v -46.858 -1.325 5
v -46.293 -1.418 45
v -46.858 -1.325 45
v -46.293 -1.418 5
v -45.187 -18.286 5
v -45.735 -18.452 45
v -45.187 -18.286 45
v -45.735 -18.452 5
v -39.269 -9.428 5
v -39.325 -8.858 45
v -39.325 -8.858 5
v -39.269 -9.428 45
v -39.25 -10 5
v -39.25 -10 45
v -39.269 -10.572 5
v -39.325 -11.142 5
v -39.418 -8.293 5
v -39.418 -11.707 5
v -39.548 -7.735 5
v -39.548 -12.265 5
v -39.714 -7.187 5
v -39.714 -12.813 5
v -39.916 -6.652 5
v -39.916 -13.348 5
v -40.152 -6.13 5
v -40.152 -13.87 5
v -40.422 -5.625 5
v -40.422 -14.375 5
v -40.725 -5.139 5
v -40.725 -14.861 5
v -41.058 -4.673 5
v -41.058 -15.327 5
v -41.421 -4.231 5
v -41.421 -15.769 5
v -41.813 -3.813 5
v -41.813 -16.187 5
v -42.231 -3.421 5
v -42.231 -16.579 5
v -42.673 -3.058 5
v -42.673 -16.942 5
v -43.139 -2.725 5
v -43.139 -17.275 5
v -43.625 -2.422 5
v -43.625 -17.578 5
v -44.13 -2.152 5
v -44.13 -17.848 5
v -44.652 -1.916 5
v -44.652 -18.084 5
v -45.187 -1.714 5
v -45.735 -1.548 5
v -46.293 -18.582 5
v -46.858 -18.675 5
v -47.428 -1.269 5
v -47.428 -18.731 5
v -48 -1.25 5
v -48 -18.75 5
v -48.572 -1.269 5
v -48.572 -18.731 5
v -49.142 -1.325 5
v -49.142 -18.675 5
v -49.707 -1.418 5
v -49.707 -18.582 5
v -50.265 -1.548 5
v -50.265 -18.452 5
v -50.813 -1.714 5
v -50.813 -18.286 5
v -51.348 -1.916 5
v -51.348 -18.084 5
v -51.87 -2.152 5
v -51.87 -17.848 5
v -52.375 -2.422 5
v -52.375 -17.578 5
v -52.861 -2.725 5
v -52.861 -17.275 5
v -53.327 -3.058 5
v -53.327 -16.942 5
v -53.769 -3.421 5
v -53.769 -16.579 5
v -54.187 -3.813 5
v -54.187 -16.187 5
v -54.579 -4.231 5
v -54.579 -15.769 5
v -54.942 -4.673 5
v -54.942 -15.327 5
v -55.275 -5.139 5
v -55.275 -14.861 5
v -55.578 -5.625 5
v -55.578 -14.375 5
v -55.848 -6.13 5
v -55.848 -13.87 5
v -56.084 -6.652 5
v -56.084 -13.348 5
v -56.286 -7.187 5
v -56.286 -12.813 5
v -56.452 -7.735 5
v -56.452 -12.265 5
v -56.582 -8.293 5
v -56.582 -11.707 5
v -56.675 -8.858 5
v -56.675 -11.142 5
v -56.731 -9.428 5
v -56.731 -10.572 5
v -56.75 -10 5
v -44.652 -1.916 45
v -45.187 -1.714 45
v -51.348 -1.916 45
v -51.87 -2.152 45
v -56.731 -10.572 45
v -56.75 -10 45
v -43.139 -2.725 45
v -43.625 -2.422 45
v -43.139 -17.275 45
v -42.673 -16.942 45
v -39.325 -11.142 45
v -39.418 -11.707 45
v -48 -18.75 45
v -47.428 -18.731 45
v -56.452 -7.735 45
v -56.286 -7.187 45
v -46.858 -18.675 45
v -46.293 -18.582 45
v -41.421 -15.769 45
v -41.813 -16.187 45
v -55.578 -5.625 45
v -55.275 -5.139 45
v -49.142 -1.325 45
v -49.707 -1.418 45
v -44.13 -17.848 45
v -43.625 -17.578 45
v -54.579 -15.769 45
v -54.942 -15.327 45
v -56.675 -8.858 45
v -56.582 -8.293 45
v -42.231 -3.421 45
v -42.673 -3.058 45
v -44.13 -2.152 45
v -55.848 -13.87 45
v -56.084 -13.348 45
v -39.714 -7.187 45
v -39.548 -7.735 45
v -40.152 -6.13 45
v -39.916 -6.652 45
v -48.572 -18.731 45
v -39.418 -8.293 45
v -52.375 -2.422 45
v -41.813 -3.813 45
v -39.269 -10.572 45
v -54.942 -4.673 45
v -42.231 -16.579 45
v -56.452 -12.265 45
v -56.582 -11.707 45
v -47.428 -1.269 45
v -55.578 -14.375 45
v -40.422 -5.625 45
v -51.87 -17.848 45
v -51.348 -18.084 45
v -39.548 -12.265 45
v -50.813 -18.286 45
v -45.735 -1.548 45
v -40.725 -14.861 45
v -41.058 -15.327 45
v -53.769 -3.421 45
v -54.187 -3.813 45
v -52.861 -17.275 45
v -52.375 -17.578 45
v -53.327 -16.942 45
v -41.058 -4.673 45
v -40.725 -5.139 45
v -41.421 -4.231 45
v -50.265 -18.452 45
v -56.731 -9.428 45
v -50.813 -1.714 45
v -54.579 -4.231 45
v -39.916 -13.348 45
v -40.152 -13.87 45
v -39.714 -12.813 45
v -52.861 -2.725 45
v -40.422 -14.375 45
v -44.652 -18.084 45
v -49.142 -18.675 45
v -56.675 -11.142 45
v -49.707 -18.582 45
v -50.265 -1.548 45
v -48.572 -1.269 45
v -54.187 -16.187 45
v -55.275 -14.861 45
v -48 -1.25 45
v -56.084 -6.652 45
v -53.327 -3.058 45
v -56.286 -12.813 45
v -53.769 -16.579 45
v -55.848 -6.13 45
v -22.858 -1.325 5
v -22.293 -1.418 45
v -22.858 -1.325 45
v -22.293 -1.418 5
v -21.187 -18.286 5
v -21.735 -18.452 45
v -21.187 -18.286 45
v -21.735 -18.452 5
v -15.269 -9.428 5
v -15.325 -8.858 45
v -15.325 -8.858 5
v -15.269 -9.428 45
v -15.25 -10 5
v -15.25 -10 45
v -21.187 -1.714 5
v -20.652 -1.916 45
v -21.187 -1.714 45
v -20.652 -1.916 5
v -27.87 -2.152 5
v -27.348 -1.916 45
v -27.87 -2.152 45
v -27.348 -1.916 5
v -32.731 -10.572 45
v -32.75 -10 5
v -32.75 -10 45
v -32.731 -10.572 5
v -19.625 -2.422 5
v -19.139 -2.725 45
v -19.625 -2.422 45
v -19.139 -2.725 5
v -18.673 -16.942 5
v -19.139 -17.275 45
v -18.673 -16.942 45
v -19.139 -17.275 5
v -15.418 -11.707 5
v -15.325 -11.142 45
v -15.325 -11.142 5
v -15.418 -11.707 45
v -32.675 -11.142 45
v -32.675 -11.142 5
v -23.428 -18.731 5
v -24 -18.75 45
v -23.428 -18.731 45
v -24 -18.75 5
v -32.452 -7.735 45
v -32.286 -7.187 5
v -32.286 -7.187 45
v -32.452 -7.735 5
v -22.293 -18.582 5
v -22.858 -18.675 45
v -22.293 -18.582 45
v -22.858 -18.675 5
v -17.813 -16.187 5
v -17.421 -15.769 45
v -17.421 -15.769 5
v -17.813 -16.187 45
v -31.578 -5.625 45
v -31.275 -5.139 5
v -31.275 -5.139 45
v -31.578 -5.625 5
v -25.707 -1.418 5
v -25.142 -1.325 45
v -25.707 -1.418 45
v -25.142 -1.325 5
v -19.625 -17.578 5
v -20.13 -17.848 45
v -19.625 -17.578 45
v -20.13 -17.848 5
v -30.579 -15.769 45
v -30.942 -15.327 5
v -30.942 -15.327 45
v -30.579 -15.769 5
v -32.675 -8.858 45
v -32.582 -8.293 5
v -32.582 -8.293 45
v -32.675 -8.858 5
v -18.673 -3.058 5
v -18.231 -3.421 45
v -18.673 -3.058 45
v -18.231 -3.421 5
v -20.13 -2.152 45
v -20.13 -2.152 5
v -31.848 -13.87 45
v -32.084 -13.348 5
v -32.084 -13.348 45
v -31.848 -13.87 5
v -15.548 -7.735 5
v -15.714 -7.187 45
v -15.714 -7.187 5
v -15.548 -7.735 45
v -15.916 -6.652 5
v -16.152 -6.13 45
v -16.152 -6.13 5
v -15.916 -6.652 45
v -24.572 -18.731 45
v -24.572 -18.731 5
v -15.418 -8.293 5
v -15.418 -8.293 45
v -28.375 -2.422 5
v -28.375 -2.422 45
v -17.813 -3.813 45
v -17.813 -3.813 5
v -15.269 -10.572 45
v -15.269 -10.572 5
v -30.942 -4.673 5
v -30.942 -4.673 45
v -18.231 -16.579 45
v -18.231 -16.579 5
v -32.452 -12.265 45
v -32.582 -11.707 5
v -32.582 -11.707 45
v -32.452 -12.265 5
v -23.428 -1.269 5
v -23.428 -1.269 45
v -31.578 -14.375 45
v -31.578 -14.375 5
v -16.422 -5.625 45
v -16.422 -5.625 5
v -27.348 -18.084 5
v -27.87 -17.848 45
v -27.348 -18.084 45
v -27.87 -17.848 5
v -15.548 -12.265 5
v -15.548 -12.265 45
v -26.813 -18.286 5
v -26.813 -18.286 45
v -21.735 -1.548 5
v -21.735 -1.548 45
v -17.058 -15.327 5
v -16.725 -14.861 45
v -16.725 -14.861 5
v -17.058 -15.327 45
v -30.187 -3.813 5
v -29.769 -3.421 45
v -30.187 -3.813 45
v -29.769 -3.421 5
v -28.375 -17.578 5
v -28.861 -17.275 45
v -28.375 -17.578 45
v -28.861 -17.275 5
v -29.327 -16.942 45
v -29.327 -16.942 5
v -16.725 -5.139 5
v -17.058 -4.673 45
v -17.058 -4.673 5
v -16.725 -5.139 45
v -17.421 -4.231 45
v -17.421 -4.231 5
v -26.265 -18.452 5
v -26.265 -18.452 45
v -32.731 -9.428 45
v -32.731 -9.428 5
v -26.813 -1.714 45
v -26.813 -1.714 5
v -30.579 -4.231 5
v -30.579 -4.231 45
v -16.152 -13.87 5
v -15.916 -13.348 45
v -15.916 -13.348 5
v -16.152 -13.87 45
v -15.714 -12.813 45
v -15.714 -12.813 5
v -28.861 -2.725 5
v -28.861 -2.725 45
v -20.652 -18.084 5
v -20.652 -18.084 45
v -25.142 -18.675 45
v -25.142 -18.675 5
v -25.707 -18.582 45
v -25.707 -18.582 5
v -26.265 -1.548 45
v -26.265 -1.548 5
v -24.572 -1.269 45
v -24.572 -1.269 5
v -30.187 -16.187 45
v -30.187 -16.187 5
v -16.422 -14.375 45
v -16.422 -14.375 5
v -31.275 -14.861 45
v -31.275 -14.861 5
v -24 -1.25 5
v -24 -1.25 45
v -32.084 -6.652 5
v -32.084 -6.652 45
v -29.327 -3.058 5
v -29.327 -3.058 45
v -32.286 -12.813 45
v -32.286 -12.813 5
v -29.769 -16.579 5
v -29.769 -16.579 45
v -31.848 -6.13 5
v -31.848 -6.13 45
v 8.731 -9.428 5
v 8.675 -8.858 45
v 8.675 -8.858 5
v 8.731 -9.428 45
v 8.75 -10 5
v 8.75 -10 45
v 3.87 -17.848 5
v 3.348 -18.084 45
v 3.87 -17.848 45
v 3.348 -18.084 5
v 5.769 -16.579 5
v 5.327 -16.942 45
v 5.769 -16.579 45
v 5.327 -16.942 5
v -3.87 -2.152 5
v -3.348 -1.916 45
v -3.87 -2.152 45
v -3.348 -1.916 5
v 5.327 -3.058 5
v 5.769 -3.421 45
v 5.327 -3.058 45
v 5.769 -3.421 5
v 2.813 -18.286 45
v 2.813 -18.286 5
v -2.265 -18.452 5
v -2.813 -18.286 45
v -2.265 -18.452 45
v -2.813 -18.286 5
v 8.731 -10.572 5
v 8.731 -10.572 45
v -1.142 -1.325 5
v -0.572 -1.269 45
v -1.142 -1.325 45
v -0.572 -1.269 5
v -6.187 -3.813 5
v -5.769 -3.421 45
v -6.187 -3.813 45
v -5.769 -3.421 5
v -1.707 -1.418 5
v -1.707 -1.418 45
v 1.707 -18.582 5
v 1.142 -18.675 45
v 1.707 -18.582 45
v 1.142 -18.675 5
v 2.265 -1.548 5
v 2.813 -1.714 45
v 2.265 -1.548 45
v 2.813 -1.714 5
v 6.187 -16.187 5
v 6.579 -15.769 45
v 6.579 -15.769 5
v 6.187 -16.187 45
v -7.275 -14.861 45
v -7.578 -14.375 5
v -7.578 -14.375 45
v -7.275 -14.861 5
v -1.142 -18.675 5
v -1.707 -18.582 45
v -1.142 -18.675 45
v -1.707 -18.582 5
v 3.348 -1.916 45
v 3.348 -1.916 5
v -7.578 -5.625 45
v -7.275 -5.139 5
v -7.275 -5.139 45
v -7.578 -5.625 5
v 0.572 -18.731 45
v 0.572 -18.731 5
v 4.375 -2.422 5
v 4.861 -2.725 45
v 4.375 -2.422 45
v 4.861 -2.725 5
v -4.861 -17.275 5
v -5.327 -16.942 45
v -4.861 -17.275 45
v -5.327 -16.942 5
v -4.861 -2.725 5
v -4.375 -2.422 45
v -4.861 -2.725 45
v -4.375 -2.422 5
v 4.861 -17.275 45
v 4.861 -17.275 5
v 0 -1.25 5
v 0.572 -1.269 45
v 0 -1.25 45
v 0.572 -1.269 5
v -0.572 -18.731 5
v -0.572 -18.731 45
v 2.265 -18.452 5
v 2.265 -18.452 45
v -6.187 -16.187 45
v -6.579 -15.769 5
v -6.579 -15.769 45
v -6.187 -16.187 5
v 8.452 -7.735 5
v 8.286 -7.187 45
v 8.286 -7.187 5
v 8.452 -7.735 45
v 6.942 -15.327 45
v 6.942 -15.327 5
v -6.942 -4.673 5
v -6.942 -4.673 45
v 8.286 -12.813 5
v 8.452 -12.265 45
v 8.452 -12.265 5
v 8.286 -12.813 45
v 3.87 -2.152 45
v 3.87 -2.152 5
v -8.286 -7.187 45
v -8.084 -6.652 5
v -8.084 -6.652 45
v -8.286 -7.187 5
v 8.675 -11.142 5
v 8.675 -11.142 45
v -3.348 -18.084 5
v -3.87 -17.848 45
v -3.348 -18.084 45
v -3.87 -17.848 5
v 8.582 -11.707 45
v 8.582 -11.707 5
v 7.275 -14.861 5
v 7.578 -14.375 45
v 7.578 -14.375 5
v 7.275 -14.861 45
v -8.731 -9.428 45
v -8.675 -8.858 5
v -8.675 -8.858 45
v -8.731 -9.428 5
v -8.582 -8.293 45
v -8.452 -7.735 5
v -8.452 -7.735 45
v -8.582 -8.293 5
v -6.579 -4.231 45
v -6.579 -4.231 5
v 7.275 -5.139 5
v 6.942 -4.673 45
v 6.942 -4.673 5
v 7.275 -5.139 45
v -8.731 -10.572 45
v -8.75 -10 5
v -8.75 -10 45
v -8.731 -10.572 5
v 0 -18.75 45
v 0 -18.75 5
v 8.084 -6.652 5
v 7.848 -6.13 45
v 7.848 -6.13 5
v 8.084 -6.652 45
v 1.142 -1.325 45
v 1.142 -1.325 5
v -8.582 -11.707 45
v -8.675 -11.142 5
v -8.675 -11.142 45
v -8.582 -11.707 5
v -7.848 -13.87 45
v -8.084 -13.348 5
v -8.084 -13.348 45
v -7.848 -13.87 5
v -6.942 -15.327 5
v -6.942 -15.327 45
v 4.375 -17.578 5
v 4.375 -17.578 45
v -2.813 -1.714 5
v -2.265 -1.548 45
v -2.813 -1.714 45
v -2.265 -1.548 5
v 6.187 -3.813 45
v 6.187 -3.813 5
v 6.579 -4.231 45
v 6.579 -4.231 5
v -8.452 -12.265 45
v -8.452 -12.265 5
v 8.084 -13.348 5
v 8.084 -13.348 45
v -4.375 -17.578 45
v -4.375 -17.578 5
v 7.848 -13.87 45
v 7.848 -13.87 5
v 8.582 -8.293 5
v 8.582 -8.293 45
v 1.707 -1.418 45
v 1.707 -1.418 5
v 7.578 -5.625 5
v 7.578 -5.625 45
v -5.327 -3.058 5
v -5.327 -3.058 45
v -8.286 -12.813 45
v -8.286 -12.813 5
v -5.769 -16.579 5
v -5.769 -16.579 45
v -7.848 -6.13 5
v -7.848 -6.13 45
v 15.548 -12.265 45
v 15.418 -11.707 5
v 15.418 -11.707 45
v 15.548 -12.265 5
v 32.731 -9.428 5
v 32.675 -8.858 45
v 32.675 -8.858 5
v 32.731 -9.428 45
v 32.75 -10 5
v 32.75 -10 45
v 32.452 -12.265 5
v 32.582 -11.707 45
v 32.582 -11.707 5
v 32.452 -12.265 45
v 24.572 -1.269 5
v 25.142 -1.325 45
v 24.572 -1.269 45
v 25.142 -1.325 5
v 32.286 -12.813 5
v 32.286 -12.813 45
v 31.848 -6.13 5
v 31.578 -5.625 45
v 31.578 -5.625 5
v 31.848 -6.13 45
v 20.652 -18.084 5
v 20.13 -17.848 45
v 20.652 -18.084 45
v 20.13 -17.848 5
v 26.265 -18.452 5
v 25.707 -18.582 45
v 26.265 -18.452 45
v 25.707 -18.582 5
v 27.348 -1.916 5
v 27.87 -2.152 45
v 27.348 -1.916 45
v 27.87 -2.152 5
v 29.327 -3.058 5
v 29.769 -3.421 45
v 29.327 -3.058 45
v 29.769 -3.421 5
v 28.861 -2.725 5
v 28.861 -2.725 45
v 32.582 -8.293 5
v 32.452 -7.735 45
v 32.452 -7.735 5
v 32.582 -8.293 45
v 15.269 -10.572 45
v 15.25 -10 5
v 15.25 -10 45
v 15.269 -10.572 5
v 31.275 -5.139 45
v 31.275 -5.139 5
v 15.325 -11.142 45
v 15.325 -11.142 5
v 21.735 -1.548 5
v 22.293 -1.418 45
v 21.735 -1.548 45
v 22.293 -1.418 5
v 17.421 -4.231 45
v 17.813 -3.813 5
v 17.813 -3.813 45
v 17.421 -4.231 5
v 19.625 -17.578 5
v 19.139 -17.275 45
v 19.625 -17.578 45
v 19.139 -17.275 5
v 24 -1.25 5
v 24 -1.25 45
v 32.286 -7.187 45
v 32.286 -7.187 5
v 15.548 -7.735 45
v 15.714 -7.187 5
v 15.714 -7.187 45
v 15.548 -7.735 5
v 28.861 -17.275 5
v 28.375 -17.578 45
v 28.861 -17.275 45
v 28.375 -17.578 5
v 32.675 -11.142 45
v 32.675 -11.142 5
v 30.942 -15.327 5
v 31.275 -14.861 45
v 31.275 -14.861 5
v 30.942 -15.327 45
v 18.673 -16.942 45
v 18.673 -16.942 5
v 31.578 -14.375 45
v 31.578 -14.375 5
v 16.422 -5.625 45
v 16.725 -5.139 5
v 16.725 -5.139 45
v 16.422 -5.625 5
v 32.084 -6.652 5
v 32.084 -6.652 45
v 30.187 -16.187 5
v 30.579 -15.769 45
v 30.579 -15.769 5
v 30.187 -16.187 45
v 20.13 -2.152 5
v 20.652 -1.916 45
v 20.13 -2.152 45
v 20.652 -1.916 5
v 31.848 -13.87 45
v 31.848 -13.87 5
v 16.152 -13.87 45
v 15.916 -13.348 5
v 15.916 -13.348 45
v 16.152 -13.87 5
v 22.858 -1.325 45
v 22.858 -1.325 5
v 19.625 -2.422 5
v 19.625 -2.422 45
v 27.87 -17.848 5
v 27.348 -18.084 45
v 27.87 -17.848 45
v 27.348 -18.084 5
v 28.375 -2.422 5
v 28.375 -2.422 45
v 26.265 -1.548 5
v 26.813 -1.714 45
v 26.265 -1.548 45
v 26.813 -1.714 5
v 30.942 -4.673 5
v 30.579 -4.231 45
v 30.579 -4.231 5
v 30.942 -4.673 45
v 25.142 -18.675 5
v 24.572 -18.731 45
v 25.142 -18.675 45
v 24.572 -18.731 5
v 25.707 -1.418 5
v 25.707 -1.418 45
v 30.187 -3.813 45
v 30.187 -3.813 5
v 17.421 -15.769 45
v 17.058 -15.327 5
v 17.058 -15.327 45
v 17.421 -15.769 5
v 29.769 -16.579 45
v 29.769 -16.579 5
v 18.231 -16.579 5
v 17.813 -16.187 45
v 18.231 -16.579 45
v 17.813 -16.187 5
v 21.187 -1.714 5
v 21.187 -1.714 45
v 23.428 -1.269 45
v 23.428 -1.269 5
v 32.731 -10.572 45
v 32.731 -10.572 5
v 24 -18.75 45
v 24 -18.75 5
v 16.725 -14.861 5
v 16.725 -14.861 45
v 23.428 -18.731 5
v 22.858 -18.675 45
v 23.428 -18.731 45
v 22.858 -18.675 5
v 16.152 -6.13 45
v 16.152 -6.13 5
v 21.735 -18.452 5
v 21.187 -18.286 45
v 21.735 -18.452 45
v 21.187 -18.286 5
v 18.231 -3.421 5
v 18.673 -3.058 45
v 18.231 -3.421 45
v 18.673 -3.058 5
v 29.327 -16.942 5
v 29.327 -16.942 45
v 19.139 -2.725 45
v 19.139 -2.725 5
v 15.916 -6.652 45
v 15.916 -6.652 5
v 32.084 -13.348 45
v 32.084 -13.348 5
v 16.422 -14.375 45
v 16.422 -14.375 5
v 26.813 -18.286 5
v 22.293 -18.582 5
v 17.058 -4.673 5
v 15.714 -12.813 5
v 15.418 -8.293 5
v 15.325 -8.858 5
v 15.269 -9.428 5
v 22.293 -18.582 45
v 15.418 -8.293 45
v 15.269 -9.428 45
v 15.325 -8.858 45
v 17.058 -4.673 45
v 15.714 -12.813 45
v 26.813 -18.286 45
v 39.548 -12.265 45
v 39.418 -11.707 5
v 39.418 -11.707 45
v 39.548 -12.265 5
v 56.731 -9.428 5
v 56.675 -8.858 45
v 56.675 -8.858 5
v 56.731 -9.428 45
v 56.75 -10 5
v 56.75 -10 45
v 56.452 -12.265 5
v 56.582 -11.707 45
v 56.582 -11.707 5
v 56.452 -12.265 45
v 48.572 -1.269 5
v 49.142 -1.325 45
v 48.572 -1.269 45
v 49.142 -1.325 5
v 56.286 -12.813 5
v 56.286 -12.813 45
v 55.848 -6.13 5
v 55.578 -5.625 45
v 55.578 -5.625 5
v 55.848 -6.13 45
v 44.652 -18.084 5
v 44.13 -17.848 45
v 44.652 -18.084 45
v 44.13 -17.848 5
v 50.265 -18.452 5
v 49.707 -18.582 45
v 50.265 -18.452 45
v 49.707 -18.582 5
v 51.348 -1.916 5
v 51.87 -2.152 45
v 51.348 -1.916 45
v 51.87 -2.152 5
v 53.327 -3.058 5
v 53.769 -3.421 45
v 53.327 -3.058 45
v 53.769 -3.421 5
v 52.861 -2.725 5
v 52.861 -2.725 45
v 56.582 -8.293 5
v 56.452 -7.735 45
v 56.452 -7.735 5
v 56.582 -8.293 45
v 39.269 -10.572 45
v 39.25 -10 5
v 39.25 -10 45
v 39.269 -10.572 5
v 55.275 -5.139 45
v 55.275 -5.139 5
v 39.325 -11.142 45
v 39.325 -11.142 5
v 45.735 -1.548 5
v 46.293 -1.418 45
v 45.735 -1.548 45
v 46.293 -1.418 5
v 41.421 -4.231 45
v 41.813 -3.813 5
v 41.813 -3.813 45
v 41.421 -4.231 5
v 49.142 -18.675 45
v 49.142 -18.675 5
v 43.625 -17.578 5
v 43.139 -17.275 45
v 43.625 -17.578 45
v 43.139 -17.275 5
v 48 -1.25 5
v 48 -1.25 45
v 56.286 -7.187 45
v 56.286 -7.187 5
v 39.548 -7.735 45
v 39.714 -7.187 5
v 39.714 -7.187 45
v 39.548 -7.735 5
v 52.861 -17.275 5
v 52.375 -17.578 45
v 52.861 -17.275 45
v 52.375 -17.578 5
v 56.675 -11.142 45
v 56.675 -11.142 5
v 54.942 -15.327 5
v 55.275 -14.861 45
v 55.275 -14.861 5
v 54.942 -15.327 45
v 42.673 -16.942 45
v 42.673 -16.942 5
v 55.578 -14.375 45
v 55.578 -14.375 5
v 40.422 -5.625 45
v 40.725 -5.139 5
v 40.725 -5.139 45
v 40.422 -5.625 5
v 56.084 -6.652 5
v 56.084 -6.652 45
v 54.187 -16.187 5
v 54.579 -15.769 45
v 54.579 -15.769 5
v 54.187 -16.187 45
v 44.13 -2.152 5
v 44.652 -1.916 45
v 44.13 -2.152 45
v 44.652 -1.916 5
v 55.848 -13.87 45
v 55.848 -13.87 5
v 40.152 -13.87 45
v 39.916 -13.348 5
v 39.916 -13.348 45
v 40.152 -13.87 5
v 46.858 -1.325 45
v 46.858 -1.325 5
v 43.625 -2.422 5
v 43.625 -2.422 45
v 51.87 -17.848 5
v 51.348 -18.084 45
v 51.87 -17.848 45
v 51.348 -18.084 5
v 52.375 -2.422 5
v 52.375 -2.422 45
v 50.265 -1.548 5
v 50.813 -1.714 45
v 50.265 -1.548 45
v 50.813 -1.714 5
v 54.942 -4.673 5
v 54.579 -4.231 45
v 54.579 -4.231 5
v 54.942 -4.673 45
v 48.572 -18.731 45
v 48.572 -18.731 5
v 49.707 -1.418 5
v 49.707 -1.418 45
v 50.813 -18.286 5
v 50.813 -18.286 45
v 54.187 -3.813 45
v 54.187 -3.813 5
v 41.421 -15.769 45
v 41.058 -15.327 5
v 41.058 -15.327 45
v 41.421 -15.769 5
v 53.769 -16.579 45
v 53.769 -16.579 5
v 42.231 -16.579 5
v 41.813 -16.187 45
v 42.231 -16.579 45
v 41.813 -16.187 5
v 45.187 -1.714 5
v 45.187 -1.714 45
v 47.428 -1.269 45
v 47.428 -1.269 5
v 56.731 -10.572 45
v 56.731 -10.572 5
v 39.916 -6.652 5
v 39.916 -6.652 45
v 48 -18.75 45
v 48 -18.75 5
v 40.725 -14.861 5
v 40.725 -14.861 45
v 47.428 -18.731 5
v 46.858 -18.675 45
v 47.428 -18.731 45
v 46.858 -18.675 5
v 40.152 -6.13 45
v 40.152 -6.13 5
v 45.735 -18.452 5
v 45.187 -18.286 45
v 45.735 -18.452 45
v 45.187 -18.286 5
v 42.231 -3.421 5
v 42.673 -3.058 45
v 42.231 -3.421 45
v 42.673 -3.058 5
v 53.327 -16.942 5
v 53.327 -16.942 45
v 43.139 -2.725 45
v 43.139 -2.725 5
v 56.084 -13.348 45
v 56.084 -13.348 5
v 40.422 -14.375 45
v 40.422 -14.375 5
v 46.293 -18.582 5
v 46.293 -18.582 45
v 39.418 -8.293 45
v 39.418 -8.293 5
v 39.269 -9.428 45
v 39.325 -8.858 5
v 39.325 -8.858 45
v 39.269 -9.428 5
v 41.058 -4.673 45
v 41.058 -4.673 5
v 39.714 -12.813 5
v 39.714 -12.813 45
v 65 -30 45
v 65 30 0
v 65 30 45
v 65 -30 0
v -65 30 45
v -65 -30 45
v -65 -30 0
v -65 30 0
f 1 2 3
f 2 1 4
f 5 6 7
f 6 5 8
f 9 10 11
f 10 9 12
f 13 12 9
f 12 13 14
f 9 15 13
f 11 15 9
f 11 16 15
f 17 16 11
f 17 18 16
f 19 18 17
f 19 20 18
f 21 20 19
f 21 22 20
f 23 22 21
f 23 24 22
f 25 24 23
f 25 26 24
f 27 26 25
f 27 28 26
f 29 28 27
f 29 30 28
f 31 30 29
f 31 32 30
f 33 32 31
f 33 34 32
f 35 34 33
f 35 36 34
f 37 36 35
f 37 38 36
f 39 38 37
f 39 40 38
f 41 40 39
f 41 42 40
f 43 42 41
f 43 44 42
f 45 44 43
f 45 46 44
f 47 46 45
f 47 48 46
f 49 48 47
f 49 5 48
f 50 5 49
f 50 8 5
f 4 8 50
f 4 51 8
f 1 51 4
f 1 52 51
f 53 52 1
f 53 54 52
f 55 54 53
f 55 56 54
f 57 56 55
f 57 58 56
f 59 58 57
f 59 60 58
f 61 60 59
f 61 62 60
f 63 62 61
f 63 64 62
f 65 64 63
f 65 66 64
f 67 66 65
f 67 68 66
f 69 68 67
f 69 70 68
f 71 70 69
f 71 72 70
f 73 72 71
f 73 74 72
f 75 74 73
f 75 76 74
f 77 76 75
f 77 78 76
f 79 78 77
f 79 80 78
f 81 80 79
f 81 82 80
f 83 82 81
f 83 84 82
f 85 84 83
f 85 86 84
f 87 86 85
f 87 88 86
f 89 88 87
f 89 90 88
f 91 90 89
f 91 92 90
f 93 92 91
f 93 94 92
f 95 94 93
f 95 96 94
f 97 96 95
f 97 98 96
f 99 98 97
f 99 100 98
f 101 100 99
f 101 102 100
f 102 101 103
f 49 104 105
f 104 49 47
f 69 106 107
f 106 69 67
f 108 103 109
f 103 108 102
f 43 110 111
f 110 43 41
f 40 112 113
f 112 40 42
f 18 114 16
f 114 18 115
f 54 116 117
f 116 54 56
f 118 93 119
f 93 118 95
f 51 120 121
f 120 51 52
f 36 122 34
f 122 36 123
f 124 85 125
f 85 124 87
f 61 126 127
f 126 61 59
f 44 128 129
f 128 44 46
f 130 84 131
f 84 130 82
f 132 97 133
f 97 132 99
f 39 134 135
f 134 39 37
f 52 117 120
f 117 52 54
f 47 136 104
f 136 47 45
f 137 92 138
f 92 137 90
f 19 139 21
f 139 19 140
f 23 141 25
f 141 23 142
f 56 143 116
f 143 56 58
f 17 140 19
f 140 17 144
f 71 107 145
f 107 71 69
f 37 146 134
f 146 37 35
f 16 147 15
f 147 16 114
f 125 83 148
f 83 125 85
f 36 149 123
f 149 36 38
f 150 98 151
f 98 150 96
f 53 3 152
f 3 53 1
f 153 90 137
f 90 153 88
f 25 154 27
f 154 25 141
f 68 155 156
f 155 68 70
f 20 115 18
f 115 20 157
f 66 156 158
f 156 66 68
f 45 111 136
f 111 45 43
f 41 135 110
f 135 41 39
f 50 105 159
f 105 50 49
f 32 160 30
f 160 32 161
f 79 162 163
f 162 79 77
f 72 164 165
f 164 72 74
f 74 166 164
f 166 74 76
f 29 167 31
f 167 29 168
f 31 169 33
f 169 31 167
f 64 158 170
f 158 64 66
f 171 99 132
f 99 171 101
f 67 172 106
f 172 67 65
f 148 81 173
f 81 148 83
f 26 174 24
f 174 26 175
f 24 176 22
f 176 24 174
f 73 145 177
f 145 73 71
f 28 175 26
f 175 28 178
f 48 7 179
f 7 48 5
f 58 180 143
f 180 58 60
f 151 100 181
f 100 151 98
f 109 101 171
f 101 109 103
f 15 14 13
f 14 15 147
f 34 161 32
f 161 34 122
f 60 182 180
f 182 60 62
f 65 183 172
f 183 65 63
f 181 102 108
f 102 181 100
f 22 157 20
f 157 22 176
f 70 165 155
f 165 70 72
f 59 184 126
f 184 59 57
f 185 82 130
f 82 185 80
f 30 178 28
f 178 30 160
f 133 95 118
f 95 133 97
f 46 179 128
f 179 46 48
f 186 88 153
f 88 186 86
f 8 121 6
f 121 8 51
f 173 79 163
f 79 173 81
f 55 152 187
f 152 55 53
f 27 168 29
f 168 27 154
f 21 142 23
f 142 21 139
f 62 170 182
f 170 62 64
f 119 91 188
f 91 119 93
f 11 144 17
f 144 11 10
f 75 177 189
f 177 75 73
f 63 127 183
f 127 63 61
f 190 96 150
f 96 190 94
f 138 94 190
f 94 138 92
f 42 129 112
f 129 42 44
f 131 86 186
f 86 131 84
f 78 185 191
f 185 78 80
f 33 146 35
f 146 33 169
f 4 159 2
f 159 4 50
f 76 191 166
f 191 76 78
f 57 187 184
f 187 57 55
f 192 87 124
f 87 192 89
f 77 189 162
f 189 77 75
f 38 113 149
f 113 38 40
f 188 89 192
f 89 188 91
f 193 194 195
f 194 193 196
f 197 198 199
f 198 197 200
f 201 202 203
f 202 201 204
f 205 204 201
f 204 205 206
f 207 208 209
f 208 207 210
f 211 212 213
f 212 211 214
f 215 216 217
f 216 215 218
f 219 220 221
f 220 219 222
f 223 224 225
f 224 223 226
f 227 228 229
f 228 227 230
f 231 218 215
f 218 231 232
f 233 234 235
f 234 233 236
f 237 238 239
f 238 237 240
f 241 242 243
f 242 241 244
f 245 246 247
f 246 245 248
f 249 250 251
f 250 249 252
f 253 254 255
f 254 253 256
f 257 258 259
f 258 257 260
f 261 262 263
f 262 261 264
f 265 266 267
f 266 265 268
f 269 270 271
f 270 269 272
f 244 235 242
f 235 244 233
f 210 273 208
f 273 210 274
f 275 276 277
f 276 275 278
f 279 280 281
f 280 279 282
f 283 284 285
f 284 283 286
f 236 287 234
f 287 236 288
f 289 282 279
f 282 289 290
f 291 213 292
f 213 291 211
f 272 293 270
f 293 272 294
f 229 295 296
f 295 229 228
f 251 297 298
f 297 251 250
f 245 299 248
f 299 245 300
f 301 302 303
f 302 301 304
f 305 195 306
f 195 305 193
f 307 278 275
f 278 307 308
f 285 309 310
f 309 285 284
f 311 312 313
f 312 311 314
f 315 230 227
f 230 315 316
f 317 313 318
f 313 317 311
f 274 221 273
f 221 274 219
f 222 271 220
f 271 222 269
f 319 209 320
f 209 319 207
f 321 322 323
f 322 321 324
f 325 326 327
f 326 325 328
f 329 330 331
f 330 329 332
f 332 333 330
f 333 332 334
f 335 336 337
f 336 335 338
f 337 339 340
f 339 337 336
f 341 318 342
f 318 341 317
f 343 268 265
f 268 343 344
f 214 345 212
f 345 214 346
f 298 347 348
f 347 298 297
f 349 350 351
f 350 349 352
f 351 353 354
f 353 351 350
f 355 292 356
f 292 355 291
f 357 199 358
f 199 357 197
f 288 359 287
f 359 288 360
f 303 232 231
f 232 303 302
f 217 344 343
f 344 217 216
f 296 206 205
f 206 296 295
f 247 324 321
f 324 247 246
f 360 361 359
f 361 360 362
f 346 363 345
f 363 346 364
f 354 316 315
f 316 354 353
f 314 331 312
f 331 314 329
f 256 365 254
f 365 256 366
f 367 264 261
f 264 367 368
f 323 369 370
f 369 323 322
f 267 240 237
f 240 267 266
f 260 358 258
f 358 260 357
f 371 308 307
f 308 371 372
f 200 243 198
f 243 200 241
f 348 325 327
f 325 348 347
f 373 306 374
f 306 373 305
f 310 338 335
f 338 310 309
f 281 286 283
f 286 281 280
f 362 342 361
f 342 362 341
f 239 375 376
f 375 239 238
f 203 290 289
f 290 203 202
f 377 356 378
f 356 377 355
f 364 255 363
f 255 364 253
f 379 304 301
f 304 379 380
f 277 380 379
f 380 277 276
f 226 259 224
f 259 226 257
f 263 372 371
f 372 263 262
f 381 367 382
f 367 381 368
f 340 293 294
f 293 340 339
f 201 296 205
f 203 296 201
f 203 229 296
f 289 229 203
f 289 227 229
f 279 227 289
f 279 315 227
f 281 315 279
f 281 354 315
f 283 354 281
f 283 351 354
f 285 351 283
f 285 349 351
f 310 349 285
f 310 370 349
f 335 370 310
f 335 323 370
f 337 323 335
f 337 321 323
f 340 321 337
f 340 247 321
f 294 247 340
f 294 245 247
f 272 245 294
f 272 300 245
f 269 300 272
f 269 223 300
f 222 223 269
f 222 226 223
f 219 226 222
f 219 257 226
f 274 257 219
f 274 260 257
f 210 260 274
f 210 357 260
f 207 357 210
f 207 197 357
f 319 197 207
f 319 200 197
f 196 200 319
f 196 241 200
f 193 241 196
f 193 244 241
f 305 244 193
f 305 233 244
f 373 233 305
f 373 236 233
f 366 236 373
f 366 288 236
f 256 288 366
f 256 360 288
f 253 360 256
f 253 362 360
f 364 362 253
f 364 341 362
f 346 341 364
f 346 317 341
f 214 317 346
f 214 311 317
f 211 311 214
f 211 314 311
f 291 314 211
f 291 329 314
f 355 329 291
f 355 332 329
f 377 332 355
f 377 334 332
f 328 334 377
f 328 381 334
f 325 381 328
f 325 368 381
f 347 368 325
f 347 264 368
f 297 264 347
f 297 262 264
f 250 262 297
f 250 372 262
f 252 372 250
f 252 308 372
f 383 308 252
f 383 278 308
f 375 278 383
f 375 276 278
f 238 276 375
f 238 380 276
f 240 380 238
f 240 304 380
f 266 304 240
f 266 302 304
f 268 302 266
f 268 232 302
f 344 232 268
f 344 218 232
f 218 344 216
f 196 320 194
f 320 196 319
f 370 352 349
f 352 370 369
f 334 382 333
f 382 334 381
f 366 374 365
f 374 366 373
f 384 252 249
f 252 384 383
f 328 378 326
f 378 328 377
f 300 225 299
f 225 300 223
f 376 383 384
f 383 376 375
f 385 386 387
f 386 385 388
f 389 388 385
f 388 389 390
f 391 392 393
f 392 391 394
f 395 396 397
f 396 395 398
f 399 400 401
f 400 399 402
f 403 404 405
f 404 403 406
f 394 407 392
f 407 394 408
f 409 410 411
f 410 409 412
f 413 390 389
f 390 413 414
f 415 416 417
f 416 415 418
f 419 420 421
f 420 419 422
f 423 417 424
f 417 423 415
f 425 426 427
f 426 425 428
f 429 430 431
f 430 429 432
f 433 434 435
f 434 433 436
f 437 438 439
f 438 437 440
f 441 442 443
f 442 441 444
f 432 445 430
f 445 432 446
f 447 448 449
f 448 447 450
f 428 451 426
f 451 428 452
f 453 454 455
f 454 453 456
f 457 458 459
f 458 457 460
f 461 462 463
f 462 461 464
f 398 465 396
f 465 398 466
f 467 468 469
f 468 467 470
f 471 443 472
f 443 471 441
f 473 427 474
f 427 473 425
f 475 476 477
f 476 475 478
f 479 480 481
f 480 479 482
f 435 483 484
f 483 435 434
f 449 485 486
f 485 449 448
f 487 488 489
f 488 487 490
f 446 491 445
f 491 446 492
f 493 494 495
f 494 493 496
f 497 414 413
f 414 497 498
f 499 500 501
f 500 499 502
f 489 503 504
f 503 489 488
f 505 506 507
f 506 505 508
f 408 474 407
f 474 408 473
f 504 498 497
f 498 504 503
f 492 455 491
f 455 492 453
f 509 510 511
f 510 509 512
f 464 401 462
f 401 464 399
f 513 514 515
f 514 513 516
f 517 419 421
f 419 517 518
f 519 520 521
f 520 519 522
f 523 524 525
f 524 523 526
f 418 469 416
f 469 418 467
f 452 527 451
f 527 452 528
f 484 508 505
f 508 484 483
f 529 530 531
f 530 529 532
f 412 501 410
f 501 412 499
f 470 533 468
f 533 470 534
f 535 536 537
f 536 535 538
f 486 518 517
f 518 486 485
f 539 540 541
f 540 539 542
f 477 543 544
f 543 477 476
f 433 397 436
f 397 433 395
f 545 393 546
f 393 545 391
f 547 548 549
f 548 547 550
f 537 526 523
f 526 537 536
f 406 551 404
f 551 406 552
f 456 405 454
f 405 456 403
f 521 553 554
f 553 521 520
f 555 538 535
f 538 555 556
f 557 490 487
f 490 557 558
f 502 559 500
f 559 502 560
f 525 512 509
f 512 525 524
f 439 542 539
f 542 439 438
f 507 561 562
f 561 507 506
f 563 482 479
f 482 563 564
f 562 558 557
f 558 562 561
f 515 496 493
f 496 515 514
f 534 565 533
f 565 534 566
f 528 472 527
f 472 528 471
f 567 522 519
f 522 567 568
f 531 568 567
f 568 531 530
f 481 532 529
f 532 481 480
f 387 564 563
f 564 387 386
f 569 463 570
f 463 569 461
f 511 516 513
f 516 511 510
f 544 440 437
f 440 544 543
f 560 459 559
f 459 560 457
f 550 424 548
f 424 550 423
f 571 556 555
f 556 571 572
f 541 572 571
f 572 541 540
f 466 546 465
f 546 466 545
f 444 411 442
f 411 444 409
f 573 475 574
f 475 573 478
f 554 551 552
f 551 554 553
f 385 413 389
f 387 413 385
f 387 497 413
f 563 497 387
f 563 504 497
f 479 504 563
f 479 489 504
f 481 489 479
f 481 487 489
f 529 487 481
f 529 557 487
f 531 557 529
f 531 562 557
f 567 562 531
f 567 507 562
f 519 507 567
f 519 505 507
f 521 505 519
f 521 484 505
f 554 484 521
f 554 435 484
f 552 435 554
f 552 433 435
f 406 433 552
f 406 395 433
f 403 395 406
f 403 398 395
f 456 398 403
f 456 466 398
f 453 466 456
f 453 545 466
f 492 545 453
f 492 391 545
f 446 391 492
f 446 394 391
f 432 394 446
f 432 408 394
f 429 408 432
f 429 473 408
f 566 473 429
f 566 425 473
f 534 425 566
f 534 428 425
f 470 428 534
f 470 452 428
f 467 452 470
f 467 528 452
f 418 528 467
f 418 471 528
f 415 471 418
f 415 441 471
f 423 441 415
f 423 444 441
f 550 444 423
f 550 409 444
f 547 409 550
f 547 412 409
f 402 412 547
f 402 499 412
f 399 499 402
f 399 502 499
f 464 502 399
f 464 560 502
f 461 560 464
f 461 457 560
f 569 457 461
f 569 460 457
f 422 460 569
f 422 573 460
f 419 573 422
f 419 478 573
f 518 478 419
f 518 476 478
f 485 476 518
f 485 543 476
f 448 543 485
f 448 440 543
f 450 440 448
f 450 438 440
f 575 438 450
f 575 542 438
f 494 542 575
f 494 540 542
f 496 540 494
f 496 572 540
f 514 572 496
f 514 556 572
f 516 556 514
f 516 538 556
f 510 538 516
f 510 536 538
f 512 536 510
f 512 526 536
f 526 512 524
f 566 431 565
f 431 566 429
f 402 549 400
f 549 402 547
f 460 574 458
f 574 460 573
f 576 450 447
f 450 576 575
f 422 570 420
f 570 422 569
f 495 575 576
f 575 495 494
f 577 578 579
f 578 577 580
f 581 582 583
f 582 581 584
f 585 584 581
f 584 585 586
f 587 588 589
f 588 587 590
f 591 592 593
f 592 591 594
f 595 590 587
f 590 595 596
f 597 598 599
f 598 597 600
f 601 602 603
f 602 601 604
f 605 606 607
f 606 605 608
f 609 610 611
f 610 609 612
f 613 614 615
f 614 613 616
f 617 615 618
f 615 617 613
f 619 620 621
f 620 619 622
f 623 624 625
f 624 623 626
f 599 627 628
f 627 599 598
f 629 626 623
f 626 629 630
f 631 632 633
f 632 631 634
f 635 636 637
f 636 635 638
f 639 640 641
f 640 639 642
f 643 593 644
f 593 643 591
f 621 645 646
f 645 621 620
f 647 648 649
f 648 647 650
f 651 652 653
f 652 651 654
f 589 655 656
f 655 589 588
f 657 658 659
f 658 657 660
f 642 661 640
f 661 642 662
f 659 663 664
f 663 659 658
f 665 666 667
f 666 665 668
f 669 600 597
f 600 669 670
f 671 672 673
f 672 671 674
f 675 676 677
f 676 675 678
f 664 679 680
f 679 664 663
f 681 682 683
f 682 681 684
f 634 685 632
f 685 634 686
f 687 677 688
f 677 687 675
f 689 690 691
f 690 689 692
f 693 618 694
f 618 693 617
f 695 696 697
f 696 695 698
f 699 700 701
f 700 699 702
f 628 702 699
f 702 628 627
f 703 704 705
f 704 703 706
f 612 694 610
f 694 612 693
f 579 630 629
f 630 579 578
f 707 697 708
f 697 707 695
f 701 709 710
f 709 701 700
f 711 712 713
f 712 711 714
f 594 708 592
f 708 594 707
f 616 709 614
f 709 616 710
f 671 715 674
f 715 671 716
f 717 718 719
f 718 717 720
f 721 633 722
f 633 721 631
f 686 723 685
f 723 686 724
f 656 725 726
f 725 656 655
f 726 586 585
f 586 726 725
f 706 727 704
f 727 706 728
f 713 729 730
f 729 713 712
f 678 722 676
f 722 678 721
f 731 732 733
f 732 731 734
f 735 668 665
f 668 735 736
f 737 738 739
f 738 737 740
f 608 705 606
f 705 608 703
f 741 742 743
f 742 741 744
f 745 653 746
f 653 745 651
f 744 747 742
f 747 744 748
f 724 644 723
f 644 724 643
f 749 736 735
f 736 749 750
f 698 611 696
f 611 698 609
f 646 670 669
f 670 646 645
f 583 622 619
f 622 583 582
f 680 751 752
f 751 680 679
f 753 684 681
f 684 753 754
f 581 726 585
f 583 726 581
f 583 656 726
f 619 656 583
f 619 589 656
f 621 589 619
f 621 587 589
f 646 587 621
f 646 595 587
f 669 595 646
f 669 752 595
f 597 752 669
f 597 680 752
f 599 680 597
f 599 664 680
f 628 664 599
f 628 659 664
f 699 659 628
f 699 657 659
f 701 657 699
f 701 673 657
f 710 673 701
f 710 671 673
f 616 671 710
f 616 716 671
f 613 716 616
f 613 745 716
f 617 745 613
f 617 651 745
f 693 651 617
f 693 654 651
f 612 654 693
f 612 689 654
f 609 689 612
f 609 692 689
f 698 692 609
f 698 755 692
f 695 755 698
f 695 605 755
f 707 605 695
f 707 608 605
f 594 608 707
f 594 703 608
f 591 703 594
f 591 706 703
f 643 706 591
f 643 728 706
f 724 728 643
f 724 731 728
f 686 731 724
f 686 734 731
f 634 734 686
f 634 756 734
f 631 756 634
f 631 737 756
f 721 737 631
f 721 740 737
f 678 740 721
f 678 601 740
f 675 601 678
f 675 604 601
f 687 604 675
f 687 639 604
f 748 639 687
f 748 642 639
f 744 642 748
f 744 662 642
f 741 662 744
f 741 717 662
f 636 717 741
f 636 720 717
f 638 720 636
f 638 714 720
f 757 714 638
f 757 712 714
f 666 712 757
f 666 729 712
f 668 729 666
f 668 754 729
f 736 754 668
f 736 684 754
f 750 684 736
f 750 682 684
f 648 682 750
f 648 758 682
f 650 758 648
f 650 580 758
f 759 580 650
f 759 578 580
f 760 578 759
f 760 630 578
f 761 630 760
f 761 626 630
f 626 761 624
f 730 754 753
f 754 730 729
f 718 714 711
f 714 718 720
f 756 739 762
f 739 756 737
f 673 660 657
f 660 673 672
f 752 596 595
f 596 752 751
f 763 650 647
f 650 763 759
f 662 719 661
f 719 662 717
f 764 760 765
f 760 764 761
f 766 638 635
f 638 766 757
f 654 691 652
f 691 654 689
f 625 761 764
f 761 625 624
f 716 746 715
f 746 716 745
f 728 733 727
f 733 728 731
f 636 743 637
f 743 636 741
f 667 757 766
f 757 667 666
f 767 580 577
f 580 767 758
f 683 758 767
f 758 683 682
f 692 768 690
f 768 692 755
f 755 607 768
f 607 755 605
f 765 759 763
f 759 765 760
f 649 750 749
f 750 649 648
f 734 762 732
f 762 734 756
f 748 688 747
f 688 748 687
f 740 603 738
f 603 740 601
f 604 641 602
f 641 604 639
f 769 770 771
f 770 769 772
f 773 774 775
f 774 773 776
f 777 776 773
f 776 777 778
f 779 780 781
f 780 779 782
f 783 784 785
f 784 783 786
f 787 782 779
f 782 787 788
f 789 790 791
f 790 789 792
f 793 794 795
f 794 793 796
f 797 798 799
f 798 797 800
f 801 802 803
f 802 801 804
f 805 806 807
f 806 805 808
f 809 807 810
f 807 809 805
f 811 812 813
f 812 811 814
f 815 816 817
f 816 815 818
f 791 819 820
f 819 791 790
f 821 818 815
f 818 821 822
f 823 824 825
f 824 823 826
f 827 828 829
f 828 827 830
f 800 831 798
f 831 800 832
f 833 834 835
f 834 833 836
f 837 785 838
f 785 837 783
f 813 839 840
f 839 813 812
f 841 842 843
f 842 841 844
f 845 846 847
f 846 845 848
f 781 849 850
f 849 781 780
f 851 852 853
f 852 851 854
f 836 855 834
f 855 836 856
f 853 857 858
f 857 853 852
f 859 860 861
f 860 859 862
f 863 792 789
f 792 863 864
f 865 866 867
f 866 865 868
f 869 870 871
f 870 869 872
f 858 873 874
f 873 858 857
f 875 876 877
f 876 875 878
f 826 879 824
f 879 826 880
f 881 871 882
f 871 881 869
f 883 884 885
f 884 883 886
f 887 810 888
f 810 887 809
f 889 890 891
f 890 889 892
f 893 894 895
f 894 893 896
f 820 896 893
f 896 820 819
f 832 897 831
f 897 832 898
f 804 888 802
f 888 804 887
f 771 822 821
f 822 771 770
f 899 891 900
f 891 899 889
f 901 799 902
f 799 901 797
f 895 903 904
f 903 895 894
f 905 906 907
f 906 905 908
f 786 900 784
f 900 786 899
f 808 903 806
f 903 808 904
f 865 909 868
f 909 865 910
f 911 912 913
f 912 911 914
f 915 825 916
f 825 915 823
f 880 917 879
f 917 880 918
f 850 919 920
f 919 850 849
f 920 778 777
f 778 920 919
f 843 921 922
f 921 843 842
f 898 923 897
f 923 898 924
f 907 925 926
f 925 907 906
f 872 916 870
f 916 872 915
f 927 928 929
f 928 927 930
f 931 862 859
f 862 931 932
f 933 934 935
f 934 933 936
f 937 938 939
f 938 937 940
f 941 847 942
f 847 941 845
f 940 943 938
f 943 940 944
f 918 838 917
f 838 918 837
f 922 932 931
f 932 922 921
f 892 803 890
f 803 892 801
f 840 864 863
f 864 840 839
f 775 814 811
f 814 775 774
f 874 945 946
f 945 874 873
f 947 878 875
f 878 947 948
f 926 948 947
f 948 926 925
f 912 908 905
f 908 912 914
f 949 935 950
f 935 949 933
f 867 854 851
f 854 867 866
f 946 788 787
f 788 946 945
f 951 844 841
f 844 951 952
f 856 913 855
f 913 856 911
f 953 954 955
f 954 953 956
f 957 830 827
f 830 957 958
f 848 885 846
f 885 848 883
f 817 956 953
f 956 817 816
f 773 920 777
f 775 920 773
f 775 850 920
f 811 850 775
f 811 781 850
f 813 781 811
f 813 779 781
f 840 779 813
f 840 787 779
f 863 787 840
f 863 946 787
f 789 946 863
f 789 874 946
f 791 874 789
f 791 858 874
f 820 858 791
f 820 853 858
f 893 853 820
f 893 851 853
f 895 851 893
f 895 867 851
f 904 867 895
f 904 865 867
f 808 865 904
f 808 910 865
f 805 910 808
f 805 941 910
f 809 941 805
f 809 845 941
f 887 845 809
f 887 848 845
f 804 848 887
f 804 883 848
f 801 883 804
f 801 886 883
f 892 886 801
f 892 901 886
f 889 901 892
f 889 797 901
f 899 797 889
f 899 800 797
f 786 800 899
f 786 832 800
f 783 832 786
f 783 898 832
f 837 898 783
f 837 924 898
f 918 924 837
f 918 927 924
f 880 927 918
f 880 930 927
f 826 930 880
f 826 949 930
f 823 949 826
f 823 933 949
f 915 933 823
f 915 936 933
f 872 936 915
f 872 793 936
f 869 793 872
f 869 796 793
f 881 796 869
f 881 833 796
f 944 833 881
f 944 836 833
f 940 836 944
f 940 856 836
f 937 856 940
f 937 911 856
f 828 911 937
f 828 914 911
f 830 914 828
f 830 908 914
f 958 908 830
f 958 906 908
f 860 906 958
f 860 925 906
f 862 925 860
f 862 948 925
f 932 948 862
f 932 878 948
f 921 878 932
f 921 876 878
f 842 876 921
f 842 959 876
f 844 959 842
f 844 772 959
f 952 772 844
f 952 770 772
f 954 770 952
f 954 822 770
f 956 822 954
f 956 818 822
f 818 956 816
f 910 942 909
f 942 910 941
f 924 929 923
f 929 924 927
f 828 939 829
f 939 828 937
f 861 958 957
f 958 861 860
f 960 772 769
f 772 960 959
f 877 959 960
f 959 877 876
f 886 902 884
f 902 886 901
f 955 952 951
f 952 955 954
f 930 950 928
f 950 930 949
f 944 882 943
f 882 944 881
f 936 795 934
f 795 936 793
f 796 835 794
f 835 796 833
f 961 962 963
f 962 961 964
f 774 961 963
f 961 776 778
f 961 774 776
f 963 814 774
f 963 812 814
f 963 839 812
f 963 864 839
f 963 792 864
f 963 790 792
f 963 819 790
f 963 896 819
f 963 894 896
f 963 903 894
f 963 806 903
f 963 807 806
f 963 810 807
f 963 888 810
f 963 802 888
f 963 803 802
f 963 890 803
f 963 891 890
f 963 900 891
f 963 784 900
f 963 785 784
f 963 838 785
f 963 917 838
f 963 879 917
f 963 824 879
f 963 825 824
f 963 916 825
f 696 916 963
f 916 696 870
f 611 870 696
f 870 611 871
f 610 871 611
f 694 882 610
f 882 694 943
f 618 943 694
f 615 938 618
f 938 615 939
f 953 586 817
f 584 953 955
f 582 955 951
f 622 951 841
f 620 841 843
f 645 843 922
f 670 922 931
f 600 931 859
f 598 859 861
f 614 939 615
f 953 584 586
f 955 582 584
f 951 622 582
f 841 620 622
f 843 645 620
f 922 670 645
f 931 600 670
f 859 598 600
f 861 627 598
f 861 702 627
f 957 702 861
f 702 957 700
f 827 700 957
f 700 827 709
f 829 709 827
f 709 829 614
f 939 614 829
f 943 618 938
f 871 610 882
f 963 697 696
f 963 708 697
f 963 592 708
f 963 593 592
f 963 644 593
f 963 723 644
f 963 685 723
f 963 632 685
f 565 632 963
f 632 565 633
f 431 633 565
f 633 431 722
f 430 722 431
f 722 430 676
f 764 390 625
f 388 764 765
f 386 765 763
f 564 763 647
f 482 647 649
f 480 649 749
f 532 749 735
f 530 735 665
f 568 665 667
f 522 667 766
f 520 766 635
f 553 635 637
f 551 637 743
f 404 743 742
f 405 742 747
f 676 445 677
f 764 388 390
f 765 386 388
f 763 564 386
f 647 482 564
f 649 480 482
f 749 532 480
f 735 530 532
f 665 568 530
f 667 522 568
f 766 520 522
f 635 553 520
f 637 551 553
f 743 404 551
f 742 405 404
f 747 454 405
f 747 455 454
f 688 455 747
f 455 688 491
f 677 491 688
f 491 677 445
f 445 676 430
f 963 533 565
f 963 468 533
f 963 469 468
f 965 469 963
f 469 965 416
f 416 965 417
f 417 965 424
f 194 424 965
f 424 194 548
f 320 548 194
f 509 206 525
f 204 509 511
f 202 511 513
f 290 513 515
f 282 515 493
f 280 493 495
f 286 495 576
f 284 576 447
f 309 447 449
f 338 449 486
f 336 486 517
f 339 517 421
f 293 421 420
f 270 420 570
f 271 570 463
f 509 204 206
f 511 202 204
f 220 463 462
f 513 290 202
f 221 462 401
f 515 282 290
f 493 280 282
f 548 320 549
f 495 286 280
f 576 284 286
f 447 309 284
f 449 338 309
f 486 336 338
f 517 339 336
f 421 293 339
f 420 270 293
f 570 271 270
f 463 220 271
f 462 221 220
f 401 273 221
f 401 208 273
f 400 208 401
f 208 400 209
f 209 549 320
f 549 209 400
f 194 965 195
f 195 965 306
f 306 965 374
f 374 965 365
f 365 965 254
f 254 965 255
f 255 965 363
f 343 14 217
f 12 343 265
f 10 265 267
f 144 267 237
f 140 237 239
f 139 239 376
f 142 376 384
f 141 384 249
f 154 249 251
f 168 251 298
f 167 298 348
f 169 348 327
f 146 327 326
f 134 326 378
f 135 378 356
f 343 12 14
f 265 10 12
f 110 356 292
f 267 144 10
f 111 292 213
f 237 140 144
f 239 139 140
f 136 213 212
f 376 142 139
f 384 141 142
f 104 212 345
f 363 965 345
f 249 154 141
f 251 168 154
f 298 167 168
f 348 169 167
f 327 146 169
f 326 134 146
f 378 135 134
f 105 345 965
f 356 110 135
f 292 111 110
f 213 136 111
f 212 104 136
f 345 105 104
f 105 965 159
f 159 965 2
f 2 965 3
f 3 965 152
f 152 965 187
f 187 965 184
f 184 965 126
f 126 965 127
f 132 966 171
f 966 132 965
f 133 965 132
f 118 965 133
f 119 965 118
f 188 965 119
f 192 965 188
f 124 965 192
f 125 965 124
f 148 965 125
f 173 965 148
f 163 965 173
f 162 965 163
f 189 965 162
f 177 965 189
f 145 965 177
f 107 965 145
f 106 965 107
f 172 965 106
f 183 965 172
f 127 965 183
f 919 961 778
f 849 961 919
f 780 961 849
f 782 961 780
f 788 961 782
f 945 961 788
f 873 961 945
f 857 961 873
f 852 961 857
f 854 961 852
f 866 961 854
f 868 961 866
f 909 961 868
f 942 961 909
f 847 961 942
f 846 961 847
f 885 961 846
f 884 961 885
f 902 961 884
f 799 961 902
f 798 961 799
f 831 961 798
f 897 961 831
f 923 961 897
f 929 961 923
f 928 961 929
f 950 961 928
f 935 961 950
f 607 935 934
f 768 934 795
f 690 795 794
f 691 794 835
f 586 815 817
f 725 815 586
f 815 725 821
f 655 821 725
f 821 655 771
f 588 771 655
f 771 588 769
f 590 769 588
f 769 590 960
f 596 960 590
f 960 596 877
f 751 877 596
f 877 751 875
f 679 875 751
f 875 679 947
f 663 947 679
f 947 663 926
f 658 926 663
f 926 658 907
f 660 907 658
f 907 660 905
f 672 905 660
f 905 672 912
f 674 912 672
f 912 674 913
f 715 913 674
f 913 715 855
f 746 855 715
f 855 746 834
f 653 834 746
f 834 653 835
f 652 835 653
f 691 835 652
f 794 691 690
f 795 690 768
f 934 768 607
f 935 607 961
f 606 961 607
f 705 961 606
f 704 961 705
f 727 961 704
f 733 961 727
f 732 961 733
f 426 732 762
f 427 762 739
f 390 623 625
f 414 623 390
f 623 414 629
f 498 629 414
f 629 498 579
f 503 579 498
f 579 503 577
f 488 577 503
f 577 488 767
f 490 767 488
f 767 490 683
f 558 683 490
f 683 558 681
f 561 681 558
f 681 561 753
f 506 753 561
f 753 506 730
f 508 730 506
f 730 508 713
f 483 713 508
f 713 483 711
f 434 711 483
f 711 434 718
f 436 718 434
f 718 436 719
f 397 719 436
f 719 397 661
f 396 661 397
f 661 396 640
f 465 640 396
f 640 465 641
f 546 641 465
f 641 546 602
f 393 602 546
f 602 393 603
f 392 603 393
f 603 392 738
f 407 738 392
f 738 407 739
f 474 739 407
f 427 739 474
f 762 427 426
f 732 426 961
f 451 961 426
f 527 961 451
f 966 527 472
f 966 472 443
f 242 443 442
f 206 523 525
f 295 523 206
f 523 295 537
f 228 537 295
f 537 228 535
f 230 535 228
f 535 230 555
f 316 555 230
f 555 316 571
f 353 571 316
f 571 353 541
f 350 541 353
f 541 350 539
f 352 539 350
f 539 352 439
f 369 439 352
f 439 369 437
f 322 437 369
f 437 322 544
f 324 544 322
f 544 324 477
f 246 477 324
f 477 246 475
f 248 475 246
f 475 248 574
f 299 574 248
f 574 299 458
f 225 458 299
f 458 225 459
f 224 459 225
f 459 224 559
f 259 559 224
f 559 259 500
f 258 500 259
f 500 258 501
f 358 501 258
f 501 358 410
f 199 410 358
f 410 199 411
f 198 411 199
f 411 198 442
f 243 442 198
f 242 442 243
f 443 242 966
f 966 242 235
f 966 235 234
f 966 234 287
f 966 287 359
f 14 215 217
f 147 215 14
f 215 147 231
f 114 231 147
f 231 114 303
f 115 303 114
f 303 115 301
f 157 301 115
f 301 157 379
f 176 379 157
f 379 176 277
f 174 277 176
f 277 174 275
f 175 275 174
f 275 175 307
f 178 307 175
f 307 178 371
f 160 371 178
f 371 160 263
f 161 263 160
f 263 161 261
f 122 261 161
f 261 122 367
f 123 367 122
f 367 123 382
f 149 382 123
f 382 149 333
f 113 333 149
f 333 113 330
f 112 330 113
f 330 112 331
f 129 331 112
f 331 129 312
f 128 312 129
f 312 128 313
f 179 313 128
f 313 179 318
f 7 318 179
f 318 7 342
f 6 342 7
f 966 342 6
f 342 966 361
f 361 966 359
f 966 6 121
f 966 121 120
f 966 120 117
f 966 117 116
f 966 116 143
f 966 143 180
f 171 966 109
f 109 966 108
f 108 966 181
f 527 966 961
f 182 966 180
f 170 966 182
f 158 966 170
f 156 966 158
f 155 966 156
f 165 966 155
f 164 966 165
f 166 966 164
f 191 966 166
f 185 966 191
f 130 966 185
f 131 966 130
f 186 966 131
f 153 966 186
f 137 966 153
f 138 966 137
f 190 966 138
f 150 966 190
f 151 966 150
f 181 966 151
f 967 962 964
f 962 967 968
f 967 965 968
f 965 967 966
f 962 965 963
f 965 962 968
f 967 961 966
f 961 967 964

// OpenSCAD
// KNOWN-WRONG PART (must fail): the holes are vertical (no tilt)
// Rack that holds five 15 mL conical tubes at a 30-degree lean (reading volumes, pipetting off
// supernatant). Category: benchware. A solid block with five blind holes tilted 30 degrees from
// vertical; the hole roofs overhang at 60 degrees from horizontal, so it prints without supports.
// Print: PLA or PETG, standing on the bed, 0.2 mm layers, 15 % infill.
// SPDX-License-Identifier: CERN-OHL-P-2.0

/* [Rack] */
block = [130, 60, 45];    // X, Y, Z [mm], centred in X and Y
n = 5;
pitch = 24;               // along X
hole_d = 17.5;            // square to the axis
tilt = 0;                 // degrees from vertical; going down, the hole moves toward +Y
entry_y = -10;            // the axis meets the top face at y = -10
depth = 40;               // along the axis, flat end square to the axis

/* [Hidden] */
eps = 0.01;

difference() {
    translate([-block.x / 2, -block.y / 2, 0]) cube(block);
    for (i = [0 : n - 1])
        translate([(i - (n - 1) / 2) * pitch, entry_y, block.z])
            rotate([tilt, 0, 0])            // local +Z (up the hole) -> (0, -sin, cos)
                translate([0, 0, -depth]) cylinder(d = hole_d, h = depth + 15, $fn = 96);
}
